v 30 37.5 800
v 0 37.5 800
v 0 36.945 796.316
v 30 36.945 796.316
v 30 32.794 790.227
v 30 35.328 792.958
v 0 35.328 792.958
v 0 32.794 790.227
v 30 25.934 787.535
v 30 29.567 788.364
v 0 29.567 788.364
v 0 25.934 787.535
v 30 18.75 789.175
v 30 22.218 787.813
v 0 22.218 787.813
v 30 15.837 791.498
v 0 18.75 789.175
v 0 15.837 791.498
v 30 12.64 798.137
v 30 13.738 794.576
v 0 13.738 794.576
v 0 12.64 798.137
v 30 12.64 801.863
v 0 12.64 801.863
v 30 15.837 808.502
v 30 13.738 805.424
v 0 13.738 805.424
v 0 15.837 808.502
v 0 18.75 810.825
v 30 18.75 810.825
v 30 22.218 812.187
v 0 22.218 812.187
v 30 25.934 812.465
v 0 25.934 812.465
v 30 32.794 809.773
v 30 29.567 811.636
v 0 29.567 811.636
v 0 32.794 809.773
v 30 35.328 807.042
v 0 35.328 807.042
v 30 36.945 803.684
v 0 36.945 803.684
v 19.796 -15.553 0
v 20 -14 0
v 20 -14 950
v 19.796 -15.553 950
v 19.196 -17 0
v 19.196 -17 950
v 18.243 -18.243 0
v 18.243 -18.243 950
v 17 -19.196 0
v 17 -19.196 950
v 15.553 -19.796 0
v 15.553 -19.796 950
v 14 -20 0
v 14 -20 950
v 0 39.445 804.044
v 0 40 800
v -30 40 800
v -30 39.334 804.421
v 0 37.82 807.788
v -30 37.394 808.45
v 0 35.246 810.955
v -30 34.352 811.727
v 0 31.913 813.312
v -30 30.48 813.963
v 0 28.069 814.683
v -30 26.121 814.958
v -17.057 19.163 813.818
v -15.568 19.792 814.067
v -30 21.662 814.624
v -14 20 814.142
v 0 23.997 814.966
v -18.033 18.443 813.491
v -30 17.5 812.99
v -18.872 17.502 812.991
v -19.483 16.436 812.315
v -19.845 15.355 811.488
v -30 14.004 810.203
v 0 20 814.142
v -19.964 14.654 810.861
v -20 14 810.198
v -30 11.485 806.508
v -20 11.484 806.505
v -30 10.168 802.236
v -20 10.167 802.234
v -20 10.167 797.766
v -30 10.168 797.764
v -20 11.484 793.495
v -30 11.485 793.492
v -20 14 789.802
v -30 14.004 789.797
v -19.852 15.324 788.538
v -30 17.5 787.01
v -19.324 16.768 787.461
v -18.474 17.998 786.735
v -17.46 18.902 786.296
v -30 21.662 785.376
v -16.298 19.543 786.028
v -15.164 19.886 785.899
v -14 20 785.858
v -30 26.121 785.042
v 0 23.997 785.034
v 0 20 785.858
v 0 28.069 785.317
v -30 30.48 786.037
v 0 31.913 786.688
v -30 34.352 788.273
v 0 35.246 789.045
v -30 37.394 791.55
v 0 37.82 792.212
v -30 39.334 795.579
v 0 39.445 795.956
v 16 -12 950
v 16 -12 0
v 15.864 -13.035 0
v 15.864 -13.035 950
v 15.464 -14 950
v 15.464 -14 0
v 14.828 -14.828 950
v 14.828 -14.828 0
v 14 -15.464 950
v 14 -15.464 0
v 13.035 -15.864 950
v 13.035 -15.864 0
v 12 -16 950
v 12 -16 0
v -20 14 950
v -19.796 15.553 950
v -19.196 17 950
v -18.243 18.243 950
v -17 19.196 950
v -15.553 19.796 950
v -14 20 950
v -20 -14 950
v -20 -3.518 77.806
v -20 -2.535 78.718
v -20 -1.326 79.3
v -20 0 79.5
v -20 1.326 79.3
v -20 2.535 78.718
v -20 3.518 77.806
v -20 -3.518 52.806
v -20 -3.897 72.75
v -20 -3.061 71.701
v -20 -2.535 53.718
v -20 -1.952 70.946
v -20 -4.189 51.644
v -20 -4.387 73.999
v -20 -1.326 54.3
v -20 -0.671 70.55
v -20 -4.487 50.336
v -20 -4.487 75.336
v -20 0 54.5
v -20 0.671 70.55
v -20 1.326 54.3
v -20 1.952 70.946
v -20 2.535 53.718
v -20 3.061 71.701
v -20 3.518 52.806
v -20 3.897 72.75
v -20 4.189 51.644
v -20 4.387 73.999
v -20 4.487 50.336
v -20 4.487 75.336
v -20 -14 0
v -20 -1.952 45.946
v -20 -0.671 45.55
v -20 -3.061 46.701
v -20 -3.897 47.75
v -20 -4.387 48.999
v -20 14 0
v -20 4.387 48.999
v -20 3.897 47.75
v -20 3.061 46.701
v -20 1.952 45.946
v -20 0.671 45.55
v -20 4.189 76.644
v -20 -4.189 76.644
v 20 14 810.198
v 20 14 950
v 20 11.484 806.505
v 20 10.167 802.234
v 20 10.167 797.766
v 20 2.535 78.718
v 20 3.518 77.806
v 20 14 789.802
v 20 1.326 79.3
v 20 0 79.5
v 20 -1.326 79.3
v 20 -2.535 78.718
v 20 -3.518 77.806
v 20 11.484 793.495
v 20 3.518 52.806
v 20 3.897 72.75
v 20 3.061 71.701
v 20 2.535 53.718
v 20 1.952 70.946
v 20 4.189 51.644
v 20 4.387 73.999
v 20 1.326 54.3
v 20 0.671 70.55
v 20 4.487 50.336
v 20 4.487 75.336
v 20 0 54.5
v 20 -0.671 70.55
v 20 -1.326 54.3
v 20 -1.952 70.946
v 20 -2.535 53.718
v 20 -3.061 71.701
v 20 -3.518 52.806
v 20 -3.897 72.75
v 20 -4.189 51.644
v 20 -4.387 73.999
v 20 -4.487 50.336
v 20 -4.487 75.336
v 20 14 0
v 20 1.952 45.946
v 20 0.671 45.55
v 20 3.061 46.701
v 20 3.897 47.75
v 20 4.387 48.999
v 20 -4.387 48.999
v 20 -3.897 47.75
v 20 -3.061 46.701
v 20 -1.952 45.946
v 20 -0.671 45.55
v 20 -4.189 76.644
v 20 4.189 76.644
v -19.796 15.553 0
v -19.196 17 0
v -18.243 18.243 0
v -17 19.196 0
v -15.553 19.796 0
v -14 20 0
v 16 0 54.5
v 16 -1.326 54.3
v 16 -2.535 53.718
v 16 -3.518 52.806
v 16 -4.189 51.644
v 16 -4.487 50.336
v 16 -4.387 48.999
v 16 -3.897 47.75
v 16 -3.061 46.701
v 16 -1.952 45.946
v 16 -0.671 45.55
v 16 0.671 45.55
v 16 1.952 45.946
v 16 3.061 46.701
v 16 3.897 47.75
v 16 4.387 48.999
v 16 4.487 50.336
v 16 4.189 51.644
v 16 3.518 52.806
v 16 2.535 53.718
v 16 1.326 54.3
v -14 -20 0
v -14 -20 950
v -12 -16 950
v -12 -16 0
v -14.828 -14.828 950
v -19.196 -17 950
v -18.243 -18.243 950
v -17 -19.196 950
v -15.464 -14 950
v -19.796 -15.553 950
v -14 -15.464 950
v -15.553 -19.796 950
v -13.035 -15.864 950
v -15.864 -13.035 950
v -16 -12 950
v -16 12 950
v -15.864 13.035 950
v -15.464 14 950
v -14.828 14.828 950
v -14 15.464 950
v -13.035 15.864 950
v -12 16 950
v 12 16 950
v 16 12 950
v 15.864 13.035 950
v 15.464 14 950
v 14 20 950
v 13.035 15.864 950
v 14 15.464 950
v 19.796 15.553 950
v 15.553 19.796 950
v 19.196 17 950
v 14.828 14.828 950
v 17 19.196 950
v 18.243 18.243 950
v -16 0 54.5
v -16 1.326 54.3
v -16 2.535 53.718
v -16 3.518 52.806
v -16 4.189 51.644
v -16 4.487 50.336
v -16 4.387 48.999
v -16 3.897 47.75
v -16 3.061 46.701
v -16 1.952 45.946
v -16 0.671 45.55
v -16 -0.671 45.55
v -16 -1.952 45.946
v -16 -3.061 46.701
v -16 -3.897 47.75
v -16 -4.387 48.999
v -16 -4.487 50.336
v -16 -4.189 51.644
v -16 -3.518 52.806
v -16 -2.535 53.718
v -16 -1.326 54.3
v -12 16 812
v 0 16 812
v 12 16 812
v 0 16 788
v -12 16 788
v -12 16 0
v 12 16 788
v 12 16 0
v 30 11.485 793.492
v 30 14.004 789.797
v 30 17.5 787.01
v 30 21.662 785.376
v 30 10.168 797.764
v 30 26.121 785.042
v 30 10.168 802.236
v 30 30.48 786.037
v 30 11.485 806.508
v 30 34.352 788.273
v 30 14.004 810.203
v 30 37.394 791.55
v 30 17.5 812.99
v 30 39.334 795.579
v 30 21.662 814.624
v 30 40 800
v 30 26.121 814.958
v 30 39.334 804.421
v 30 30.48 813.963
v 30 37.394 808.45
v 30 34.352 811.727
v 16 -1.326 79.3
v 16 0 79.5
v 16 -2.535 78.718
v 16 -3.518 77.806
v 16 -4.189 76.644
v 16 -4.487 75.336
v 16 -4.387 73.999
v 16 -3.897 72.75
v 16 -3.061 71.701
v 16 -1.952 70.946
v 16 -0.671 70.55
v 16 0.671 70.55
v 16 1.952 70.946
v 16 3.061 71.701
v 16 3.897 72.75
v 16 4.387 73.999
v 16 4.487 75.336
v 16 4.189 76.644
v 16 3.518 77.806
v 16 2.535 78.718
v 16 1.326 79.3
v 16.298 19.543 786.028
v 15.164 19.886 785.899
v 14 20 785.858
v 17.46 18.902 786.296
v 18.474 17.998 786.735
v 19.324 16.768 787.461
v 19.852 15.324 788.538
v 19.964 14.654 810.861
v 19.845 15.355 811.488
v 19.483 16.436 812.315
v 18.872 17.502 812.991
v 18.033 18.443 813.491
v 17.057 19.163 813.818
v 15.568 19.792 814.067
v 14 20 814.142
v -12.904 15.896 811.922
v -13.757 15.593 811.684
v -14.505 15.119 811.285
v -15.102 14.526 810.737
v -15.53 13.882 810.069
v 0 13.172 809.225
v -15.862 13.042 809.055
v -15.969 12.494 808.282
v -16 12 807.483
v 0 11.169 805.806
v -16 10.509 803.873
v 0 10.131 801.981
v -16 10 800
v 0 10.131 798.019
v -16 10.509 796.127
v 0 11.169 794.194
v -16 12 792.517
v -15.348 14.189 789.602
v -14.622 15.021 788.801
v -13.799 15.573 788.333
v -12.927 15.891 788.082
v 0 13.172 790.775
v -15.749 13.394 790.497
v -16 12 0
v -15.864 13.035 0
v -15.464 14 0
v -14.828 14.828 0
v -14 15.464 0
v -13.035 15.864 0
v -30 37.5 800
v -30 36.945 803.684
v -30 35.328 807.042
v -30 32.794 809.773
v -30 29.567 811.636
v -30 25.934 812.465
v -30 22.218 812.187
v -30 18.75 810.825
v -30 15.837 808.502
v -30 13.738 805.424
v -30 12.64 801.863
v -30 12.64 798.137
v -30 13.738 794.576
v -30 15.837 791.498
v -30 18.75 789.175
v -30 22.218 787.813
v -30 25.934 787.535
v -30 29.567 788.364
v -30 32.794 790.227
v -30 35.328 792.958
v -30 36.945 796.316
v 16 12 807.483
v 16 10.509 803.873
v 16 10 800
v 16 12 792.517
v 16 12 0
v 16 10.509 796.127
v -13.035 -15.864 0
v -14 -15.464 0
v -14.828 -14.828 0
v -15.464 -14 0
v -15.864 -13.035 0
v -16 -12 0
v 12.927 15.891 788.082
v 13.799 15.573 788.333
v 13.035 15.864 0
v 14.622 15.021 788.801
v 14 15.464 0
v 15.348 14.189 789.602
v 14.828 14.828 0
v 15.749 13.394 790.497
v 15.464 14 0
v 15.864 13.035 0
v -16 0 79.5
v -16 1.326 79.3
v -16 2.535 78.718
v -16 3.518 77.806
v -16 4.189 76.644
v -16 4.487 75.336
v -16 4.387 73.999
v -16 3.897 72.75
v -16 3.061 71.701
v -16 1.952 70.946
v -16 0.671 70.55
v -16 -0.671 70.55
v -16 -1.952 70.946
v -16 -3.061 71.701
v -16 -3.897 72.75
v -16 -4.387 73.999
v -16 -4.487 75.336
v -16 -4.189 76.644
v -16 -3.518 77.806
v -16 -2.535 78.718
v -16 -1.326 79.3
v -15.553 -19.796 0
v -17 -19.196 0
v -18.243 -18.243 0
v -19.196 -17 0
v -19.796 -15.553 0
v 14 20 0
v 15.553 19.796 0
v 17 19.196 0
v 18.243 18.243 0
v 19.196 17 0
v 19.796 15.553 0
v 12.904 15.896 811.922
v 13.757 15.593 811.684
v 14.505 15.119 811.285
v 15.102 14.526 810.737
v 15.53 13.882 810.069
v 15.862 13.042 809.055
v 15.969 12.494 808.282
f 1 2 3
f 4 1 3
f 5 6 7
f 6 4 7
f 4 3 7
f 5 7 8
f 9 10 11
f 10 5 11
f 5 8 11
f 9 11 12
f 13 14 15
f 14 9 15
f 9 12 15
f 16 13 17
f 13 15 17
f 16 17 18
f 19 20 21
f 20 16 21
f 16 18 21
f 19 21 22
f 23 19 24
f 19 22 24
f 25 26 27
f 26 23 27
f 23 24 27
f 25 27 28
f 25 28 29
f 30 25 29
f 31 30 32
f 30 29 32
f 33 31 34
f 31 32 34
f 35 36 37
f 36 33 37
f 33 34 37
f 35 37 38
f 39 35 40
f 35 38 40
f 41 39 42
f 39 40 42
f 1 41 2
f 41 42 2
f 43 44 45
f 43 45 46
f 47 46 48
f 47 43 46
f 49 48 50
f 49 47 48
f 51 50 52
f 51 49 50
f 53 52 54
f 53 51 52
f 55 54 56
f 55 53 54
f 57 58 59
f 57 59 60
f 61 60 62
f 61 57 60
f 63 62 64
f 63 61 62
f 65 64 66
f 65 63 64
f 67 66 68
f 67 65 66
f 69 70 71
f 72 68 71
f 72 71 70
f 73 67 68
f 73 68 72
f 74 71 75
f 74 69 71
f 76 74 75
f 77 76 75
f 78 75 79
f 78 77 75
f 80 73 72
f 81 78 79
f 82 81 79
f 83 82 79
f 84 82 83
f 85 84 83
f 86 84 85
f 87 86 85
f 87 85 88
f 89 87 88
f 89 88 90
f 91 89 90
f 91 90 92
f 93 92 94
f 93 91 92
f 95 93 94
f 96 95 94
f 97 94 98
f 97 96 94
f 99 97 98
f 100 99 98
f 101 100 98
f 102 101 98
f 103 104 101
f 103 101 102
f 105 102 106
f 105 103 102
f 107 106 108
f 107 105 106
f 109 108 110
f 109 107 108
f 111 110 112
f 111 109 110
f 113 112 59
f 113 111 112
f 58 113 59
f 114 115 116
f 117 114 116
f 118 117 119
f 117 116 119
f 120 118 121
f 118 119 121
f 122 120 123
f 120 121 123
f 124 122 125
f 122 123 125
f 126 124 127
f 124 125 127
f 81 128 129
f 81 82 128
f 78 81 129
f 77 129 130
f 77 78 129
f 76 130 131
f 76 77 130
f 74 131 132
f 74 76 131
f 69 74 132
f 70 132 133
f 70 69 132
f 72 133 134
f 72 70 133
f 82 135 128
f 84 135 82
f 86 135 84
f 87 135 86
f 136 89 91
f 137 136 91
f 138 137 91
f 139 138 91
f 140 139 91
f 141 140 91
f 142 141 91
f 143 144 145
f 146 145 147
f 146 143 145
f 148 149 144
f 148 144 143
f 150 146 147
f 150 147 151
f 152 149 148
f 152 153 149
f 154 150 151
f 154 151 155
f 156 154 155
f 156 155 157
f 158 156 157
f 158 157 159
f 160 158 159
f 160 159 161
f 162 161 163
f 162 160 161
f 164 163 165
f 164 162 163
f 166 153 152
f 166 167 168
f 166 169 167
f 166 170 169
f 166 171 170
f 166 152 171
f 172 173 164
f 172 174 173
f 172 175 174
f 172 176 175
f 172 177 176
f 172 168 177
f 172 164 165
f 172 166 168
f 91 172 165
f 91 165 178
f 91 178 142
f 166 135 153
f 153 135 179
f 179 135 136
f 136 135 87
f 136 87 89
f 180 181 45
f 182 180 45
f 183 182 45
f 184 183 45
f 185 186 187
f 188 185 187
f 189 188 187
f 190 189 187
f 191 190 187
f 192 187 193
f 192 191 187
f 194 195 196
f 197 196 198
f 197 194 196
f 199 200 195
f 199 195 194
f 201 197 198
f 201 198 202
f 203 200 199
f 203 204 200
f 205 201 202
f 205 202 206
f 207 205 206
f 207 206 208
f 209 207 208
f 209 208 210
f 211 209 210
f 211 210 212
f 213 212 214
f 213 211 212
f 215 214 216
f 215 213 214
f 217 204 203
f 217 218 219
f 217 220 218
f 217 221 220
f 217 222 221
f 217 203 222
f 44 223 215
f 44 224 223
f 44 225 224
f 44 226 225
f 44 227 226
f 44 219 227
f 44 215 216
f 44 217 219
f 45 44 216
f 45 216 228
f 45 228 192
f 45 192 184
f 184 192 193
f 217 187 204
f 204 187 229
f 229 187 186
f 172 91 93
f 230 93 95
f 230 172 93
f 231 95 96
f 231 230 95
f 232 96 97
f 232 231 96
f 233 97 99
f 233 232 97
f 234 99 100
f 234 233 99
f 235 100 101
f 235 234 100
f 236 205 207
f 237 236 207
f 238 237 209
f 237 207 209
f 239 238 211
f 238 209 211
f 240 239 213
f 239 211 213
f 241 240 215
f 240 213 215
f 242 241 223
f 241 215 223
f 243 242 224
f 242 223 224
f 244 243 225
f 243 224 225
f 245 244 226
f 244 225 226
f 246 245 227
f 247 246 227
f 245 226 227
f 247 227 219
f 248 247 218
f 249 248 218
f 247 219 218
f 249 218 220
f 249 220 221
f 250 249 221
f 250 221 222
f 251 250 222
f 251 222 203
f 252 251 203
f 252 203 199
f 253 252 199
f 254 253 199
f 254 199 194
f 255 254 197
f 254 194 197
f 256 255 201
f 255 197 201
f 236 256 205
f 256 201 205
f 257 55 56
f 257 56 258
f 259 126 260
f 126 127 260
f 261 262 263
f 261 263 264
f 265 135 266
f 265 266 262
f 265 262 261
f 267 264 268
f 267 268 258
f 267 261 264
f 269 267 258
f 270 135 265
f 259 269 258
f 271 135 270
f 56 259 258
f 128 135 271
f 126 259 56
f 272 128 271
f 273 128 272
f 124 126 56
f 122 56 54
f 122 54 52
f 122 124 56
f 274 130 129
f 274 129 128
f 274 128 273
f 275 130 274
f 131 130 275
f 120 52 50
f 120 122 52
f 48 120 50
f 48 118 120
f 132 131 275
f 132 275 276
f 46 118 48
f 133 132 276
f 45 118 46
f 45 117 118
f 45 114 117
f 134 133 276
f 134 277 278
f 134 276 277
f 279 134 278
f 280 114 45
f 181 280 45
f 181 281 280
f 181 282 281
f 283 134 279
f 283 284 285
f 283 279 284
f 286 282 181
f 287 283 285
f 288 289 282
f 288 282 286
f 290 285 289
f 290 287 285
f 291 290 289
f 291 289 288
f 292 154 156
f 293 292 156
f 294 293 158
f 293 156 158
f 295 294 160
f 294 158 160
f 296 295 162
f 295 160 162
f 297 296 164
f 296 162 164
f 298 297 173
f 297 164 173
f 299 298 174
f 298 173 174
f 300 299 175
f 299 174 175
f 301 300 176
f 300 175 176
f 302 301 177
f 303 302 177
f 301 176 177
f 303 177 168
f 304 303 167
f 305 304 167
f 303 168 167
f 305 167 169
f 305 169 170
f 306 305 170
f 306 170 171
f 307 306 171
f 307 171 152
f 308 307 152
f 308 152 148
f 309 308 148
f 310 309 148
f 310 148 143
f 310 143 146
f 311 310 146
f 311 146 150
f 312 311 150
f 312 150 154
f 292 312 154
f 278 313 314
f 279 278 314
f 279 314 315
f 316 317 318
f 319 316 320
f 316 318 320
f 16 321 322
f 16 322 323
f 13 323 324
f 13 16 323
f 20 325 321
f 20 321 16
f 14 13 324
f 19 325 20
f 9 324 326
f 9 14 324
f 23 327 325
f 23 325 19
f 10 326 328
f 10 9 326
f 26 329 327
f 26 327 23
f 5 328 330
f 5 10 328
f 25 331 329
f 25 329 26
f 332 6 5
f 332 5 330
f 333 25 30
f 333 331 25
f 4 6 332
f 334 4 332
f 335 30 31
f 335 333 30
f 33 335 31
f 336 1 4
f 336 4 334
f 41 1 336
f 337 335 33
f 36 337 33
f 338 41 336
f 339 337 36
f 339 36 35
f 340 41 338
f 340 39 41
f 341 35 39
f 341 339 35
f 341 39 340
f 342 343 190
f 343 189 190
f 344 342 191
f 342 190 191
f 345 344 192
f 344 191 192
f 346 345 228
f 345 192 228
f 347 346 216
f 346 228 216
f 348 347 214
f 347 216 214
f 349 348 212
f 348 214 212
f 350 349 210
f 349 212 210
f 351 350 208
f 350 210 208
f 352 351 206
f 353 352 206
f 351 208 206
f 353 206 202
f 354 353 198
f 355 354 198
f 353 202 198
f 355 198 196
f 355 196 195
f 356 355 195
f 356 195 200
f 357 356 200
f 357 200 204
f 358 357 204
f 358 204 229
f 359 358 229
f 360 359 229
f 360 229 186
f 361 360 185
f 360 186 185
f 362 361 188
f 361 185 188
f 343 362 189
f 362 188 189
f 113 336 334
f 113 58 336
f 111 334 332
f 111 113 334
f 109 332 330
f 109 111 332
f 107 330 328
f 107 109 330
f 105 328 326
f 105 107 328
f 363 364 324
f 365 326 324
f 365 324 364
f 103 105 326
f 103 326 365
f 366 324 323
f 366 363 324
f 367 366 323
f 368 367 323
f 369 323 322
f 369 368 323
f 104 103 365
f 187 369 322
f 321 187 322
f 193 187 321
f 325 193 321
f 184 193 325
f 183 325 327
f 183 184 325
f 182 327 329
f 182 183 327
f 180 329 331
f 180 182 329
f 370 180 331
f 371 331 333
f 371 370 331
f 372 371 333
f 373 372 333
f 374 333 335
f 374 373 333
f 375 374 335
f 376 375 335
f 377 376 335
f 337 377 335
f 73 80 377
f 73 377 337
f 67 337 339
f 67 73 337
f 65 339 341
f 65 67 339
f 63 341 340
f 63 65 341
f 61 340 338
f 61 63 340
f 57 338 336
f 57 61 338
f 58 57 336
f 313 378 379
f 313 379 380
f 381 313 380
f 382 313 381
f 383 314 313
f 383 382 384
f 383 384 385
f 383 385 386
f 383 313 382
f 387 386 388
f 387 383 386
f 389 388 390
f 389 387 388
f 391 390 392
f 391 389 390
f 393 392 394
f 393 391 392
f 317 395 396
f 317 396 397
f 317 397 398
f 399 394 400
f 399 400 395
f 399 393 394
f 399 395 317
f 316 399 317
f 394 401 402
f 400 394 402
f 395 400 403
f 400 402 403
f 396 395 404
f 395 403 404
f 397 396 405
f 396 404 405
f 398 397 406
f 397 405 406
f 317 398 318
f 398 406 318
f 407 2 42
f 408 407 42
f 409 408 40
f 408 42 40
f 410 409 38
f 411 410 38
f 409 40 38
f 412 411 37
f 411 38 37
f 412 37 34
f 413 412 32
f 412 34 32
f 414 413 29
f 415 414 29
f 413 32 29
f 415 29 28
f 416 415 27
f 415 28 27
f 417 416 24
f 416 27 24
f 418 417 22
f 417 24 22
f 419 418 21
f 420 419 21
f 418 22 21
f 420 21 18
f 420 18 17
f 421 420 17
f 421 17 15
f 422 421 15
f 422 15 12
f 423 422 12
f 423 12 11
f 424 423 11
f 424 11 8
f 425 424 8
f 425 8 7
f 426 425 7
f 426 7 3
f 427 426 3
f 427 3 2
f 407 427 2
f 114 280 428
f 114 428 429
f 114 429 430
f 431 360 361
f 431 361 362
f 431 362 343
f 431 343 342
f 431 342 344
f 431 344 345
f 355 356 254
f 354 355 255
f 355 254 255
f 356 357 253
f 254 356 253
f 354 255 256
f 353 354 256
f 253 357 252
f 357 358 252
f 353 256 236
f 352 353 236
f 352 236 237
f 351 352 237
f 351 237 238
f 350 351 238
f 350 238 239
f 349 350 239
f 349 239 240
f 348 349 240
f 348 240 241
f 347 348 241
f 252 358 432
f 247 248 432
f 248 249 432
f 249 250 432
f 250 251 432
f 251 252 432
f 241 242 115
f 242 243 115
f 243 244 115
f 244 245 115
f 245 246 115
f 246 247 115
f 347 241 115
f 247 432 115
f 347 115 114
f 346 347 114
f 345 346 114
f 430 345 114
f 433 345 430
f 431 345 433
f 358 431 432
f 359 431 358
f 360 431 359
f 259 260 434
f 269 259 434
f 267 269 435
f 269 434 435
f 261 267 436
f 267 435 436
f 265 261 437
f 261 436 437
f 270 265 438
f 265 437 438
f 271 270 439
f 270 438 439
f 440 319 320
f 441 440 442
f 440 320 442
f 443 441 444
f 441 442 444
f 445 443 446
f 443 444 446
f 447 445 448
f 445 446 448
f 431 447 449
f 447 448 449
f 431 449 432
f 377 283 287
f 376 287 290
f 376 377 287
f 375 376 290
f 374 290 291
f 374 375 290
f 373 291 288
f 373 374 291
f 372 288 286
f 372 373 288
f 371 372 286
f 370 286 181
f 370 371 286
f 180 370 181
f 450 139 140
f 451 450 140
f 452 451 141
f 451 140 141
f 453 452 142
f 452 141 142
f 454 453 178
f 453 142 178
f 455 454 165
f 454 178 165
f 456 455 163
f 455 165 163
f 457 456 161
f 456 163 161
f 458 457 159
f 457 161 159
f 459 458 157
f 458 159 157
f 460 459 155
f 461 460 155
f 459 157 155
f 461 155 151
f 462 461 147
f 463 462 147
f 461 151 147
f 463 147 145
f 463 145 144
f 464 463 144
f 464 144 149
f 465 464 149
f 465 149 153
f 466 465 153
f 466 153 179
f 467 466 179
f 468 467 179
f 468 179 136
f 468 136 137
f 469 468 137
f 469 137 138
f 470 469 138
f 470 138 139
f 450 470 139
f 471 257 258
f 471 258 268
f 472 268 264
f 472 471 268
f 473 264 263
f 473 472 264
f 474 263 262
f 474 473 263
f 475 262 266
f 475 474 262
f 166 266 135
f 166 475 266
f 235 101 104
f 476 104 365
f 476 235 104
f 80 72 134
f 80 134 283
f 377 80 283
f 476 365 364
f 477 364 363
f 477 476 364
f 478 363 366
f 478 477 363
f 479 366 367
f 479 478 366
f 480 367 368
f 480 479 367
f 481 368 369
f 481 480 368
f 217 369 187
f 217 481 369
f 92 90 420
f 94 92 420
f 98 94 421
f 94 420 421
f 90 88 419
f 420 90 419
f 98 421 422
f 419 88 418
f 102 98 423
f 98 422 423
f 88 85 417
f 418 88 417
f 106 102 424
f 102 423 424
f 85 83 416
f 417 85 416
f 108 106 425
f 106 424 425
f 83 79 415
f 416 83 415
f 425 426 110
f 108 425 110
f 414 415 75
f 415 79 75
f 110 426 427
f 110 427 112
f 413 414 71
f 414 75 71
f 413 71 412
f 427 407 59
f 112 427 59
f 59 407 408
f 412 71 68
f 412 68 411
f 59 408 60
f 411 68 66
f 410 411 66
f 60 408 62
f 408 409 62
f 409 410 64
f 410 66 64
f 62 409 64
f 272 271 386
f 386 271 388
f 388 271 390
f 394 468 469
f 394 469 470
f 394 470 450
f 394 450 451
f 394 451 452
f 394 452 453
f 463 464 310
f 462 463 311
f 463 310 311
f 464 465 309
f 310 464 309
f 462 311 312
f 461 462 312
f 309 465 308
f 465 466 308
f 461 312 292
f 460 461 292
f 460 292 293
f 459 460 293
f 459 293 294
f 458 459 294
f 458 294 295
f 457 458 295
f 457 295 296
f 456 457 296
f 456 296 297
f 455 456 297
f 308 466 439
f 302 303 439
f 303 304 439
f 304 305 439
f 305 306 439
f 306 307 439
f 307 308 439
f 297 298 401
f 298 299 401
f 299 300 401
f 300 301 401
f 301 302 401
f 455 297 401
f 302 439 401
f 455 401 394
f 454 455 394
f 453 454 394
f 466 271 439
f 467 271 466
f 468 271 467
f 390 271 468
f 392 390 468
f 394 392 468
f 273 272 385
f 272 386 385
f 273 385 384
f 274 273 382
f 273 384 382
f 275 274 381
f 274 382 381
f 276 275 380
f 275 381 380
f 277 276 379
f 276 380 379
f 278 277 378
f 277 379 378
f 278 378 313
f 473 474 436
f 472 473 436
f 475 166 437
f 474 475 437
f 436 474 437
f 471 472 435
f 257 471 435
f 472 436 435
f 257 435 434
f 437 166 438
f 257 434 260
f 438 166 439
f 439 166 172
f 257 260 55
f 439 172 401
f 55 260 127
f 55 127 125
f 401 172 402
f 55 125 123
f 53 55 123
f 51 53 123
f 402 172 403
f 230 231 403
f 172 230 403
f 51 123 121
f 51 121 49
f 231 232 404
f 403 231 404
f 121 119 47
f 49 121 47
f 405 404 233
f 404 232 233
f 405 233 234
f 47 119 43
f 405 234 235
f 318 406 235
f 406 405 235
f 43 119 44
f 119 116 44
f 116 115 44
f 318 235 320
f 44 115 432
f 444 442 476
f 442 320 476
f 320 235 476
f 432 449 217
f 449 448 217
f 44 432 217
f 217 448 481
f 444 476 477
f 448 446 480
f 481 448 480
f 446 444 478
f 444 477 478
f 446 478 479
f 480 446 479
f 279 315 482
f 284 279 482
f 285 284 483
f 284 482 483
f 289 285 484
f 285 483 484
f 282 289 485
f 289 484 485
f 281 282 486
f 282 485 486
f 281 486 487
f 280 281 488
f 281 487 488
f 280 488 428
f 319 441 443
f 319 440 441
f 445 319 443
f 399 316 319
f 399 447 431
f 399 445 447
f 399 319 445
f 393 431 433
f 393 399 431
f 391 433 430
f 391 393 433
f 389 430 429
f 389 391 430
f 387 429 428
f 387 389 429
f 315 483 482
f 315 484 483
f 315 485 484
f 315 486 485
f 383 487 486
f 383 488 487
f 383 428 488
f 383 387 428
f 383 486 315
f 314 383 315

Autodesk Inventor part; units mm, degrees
ref_plane "YZ Plane" through (0, 0, 0) normal (1, 0, 0) x (0, 1, 0)
ref_plane "Start plane" through (0, 0, 0) normal (0, 0, 1) x (1, 0, 0)
ref_plane "End plane" through (0, 0, 950) normal (0, 0, 1) x (1, 0, 0)
sketch "Sketch" plane through (0, 0, 0) normal (0, 0, 1) x (1, 0, 0)
  line L0 (-20, -14) -> (-20, 14)
  line L1 (-14, 20) -> (14, 20)
  line L2 (20, 14) -> (20, -14)
  line L3 (14, -20) -> (-14, -20)
  arc A0 (-20, -14) -> (-14, -20) centre (-14, -14) ccw
  arc A1 (-14, 20) -> (-20, 14) centre (-14, 14) ccw
  arc A2 (20, 14) -> (14, 20) centre (14, 14) ccw
  arc A3 (14, -20) -> (20, -14) centre (14, -14) ccw
  line L4 (-12, 16) -> (12, 16)
  line L5 (16, 12) -> (16, -12)
  line L6 (12, -16) -> (-12, -16)
  line L7 (-16, -12) -> (-16, 12)
  line L8 (0, 29.7397) -> (0, -29.7397) construction
  line L9 (-29.7397, 0) -> (29.7397, 0) construction
  arc A4 (-16, -12) -> (-12, -16) centre (-12, -12) ccw
  arc A5 (-12, 16) -> (-16, 12) centre (-12, 12) ccw
  arc A6 (16, 12) -> (12, 16) centre (12, 12) ccw
  arc A7 (12, -16) -> (16, -12) centre (12, -12) ccw
  dimension "d7" = 6
  dimension "d10" = 40
  dimension "d11" = 40
  dimension "d12" = 4
  dimension "d15" = 20
  dimension "d16" = 20
  dimension "d19" = 4
  dimension "d20" = 4
extrude "Body" add sketch "Sketch" along normal up to surface (950 mm away) from surface at 0
sketch "Sketch3" plane through (0, 0, 0) normal (0, 0, 1) x (1, 0, 0)
  line L0 (0, 0) -> (10, 0)
ref_plane "Work Plane3" through (0, 0, 0) normal (0, -1, 0) x (1, 0, 0)
sketch "Sketch4" plane through (0, 0, 0) normal (0, -1, 0) x (1, 0, 0)
  line L0 (-2, 0) -> (12, 0)
  line L1 (-2, 950) -> (12, 950)
  dimension "d18" = 950
sketch "Sketch5" plane through (0, -20, 0) normal (1, 0, 0) x (0, 1, 0)
  line L0 (20, 0) -> (20, 75)
  point P0 (20, 50)
  dimension "d21" = 75
  dimension "d22" = 25
hole "Hole1" at (0, 0, 50) at (0, 0, 75) direction (1, 0, 0) diameter 9 end through all clearance for "Hex Head Cap Screw ISO 24017" size "M8" standard "ISO"
sketch "Sketch6" plane through (0, 0, 0) normal (1, 0, 0) x (0, 1, 0)
  circle A0 centre (25, 800) radius 15
  circle A1 centre (25, 800) radius 12.5
  point P0 (0, 0)
  dimension "d30" = 30
  dimension "d31" = 800
  dimension "d35" = 25
  dimension "d36" = 25
extrude "Extrusion2" cut sketch "Sketch6" against normal through all both and the other way through all contours A0 | A1
extrude "Extrusion3" add sketch "Sketch6" along normal mid plane 60
mirror "Mirror1" about plane through (0, 0, 0) normal (1, 0, 0) of "Hole1"
equation "\"d7\" = G_IR"
equation "\"d10\" = G_H"
equation "\"d11\" = G_W"
equation "\"d12\" = G_T"
equation "\"d15\" = 0.5 * d10"
equation "\"d16\" = 0.5 * d11"
equation "\"d19\" = G_T"
equation "\"d20\" = G_T"
equation "\"d3\" = G_L"
equation "\"G_W\" = 40"
equation "\"G_H\" = 40"
equation "\"G_T\" = 4"
equation "\"G_IR\" = 6"
equation "\"G_L\" = d18"
equation "\"G_OFFSET_START\" = 0"
equation "\"G_OFFSET_END\" = 0"
properties part number "EN 10210-2 - 40 x 40 x 4 - 950" material "Steel, Mild"
